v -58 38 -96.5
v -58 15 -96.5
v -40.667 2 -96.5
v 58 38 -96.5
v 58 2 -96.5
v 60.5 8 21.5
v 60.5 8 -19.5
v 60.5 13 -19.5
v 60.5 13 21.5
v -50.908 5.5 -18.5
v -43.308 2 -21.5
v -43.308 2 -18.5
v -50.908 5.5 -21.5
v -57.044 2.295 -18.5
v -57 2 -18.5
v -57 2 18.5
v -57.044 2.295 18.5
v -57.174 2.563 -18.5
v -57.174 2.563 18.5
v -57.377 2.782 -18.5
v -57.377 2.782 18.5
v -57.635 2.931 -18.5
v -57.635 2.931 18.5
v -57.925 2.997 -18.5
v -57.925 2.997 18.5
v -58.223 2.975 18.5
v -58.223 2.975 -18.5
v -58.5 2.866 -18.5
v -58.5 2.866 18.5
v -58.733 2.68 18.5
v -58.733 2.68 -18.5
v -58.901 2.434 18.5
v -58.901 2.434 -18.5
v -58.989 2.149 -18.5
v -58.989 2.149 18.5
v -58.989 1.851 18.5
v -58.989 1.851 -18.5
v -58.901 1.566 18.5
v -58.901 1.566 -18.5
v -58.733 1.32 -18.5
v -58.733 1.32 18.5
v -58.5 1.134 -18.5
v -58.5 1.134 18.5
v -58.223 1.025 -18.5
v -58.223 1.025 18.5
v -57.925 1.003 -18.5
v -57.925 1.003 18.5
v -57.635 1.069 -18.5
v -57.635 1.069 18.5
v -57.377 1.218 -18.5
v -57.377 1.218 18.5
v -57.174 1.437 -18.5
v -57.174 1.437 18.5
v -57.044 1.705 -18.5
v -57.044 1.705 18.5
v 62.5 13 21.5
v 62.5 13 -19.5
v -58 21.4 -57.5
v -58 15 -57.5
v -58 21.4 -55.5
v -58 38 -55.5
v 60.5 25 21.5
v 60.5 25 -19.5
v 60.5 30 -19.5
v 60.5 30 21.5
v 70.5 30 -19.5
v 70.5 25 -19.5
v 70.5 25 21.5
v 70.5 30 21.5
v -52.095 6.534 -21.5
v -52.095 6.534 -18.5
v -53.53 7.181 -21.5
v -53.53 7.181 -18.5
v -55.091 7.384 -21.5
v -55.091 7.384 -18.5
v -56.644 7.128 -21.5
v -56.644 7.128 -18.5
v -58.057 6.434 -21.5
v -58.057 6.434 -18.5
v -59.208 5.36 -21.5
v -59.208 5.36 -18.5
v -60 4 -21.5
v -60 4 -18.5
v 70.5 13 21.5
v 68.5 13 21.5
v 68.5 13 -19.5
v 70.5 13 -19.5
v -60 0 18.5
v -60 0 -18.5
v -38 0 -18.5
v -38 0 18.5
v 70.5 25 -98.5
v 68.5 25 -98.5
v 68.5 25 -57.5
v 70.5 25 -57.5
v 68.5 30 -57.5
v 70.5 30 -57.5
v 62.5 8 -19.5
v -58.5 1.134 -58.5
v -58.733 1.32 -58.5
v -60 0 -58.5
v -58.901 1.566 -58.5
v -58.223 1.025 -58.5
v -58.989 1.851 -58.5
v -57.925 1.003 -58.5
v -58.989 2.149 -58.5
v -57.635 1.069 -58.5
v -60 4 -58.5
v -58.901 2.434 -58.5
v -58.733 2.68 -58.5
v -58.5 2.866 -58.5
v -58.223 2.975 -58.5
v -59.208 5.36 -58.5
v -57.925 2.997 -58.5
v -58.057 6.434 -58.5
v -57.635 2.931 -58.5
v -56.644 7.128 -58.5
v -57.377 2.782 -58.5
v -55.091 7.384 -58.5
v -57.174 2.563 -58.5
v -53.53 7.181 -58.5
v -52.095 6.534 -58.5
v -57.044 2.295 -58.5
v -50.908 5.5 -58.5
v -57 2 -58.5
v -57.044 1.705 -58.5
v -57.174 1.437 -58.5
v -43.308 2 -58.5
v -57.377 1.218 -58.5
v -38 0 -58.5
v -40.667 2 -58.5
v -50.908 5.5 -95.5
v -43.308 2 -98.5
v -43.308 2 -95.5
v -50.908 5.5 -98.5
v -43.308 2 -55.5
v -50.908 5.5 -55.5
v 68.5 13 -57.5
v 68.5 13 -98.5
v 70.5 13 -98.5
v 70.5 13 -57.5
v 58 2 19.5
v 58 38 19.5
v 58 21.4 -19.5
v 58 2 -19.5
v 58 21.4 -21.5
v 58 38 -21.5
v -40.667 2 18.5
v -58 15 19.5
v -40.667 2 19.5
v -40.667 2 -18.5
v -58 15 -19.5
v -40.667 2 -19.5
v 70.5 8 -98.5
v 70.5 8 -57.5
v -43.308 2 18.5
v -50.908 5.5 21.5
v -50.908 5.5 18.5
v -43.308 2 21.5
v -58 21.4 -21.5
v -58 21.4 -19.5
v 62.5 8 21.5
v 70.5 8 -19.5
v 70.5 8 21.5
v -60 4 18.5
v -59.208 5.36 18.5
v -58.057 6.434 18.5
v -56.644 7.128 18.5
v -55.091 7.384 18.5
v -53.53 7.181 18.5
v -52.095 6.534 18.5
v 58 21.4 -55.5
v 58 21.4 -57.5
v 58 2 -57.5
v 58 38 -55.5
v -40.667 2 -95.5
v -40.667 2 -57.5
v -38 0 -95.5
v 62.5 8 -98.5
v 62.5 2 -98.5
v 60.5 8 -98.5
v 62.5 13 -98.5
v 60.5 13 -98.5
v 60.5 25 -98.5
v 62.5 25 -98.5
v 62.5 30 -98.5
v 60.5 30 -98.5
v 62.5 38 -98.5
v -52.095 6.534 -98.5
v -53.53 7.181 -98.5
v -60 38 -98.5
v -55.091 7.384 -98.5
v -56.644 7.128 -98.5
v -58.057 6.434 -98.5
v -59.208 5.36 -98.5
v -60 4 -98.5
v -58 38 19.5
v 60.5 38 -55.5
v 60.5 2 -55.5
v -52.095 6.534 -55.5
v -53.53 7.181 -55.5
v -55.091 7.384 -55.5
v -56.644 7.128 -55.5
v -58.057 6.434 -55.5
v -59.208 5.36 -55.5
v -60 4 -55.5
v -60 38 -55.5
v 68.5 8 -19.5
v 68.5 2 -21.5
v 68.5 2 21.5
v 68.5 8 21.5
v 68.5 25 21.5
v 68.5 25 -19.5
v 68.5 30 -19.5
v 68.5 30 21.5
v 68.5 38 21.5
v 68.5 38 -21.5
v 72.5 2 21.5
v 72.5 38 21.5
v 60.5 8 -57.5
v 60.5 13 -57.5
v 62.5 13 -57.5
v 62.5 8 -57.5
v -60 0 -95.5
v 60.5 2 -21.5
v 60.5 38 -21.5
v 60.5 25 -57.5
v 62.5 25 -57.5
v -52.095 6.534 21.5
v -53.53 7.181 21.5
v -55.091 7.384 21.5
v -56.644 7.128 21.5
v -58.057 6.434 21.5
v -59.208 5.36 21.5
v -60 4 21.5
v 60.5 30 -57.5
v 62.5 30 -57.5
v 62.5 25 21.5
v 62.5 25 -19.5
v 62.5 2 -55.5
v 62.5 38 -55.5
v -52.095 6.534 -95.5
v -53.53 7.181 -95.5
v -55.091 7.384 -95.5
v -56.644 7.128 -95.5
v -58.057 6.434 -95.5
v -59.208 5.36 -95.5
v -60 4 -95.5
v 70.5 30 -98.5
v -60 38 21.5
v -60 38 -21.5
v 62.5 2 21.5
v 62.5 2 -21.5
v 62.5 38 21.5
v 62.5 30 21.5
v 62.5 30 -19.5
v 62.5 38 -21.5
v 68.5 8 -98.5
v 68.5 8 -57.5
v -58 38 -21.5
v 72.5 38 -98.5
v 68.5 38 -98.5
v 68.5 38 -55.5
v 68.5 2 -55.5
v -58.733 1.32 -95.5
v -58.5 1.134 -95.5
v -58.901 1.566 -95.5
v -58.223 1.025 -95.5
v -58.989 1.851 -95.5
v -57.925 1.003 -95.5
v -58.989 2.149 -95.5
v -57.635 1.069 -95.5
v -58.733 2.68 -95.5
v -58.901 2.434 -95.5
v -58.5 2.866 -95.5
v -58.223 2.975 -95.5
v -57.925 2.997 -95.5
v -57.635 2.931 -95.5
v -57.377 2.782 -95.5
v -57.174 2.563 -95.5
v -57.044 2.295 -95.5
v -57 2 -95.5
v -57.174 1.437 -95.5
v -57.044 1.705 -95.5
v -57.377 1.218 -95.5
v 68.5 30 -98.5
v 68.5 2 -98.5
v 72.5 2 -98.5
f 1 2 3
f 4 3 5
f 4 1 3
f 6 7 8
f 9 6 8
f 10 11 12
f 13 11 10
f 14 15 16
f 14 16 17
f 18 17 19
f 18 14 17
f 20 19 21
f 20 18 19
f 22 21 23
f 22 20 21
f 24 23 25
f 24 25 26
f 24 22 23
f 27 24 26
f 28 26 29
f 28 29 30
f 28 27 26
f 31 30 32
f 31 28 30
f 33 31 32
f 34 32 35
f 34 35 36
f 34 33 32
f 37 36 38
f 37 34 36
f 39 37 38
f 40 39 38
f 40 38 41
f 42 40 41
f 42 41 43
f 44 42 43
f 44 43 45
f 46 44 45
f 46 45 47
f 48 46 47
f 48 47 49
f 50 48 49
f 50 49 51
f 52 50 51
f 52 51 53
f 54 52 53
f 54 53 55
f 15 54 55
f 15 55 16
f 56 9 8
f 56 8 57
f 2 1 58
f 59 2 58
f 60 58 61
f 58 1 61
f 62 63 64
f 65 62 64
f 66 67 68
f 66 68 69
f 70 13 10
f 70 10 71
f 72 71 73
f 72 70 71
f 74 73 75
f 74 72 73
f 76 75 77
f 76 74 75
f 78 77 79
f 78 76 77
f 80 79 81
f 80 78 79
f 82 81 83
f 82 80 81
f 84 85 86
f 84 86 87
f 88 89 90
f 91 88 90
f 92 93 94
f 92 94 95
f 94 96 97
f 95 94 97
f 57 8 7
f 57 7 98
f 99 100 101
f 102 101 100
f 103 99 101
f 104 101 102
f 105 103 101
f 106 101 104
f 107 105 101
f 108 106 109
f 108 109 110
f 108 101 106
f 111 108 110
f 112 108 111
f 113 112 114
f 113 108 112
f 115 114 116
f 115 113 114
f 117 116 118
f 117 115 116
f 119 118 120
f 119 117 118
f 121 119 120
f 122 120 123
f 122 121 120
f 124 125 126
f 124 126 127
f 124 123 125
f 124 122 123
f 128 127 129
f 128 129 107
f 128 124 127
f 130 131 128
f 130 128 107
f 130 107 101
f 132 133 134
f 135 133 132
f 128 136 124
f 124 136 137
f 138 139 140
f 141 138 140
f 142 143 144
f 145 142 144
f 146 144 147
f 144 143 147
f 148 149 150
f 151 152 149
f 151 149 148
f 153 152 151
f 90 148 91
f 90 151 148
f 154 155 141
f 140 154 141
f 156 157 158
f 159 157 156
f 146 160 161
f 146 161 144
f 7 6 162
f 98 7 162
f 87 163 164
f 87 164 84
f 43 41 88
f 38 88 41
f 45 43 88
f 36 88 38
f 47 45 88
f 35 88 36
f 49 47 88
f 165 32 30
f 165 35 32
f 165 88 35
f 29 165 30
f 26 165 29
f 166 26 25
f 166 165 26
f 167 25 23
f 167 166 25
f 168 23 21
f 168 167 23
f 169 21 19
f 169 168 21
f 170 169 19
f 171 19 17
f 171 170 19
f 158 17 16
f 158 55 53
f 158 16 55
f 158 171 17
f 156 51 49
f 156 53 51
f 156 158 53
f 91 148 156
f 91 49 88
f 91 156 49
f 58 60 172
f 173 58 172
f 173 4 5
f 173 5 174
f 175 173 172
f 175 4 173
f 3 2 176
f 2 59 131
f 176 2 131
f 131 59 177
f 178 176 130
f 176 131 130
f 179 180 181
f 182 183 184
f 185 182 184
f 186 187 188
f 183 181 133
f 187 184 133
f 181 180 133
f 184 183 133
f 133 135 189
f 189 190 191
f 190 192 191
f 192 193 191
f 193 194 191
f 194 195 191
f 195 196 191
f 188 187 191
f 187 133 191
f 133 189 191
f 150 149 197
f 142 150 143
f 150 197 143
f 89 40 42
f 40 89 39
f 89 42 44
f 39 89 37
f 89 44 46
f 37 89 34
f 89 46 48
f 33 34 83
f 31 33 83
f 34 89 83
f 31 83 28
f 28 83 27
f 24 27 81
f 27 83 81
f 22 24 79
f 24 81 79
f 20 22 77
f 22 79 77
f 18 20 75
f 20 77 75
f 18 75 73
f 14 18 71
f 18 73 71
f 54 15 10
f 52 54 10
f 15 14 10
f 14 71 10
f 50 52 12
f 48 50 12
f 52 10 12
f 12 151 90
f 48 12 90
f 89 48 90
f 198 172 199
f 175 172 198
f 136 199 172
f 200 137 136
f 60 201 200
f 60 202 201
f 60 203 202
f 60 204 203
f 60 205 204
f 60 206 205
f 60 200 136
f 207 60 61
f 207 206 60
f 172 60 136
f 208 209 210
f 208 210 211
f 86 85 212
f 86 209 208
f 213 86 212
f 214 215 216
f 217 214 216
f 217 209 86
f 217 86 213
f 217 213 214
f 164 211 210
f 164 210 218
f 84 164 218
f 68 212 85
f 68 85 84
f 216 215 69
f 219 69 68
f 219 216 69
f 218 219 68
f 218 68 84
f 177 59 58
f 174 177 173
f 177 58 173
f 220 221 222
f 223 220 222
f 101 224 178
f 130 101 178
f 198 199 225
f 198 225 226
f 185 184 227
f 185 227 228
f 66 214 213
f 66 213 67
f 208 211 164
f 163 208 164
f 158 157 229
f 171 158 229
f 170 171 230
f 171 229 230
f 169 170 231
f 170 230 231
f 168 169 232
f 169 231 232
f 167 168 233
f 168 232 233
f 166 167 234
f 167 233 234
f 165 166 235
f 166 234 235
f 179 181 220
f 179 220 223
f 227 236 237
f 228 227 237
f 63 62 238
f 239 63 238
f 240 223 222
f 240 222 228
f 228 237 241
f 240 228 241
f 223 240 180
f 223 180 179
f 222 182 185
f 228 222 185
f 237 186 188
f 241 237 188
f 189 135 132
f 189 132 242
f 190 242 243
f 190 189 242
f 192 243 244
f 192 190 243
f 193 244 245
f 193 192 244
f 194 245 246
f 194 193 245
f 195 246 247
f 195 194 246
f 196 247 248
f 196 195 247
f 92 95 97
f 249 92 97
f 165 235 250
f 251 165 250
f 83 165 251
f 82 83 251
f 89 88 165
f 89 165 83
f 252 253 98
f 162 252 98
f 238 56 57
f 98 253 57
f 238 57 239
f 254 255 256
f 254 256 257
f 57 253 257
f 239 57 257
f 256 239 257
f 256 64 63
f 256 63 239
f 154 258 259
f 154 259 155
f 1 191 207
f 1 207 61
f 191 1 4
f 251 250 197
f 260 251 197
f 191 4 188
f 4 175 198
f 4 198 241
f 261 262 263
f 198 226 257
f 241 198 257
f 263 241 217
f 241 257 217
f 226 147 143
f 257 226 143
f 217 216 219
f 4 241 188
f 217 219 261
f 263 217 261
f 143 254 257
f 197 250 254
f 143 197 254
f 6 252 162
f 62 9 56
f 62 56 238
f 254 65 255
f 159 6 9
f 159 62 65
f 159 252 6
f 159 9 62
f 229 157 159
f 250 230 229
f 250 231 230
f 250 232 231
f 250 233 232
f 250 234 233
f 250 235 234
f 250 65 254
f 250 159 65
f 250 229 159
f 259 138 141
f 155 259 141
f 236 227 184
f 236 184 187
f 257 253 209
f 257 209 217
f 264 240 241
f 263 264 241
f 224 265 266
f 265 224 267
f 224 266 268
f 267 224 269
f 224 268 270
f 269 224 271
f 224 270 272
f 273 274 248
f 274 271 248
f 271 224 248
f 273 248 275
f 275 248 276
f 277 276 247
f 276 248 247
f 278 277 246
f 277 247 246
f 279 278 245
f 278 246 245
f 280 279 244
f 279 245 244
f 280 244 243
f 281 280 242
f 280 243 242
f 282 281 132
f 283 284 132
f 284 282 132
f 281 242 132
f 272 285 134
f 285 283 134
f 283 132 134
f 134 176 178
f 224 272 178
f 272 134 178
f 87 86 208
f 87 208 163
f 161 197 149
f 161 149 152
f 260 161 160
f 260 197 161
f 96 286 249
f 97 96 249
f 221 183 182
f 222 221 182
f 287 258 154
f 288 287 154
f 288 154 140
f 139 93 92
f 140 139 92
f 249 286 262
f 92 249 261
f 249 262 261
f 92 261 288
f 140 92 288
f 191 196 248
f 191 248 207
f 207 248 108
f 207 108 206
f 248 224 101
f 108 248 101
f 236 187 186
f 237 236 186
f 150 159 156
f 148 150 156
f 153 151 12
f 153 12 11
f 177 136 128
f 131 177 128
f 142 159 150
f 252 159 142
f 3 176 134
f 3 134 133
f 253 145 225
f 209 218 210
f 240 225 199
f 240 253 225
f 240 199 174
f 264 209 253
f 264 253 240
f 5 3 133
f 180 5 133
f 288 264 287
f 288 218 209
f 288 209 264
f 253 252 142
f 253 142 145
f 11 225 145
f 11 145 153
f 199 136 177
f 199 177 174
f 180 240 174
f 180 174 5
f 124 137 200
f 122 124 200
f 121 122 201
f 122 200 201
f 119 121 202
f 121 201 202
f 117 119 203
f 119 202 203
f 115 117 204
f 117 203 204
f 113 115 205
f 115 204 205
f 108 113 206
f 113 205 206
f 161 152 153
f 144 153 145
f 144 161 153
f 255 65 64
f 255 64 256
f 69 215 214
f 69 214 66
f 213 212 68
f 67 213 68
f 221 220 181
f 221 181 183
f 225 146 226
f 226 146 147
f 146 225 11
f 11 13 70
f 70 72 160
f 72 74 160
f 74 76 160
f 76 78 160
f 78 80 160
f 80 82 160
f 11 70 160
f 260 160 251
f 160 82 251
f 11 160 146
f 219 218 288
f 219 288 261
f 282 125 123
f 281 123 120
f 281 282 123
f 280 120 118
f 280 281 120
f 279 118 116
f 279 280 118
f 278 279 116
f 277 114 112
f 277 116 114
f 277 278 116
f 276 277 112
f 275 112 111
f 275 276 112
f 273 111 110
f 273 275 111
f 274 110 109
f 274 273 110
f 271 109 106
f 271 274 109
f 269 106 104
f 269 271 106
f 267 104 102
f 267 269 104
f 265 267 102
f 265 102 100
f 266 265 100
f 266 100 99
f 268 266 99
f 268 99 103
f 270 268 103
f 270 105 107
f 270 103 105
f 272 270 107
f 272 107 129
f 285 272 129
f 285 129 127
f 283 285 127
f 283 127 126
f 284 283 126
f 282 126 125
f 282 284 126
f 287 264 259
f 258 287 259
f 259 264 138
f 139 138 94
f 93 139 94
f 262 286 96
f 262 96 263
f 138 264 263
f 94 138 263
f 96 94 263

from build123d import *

# Parameters (mm, degrees)
SKETCH2_W            = 120
SKETCH2_H            = 43
BOSS_EXTRUDE1_DEPTH  = 38
SKETCH3_W            = 116
SKETCH3_H            = 39
CUT_EXTRUDE1_DEPTH   = 38
BOSS_EXTRUDE2_DEPTH  = 39
SKETCH5_W            = 43
SKETCH5_H            = 38
BOSS_EXTRUDE3_DEPTH  = 2.5
SKETCH6_W            = 2
SKETCH6_H            = 38
BOSS_EXTRUDE4_DEPTH  = 17
SKETCH7_W            = 34
SKETCH7_H            = 38
BOSS_EXTRUDE5_DEPTH  = 10
SKETCH8_W            = 4
SKETCH8_H            = 38
BOSS_EXTRUDE6_DEPTH  = 43
SKETCH9_W            = 10
SKETCH9_H            = 5
CUT_EXTRUDE2_DEPTH   = 41
SKETCH11_W           = 120
SKETCH11_H           = 2
CUT_EXTRUDE3_DEPTH   = 110.5
CUT_EXTRUDE4_DEPTH   = 3
MIRROR4_COPY_1_DEPTH = 3
CUT_EXTRUDE5_START   = -114
SKETCH13_R           = 1
CUT_EXTRUDE5_DEPTH   = 114
SKETCH14_W           = 116
SKETCH14_H           = 2
CUT_EXTRUDE6_DEPTH   = 16.6


with BuildPart() as part:
    # Sketch2 → Boss-Extrude1 (new body)
    with BuildSketch(Plane(origin=(0, 0, 0), x_dir=(1, 0, 0), z_dir=(0, 1, 0))):
        Rectangle(SKETCH2_W, SKETCH2_H)
    extrude(amount=BOSS_EXTRUDE1_DEPTH)

    # Sketch3 → Cut-Extrude1 (cut)
    with BuildSketch(Plane(origin=(0, 38, 0), x_dir=(1, 0, 0), z_dir=(0, 1, 0))):
        Rectangle(SKETCH3_W, SKETCH3_H)
    extrude(amount=-CUT_EXTRUDE1_DEPTH, mode=Mode.SUBTRACT)

    # Sketch4 → Boss-Extrude2 (add)
    with BuildSketch(Plane.XY.offset(-19.5)):
        Polygon((-58, 0), (-58, 15), (-38, 0), align=None)
    extrude(amount=BOSS_EXTRUDE2_DEPTH)

    # Sketch5 → Boss-Extrude3 (add)
    with BuildSketch(Plane(origin=(60, 0, 0), x_dir=(0, 0, -1), z_dir=(1, 0, 0))):
        with Locations((0, 19)):
            Rectangle(SKETCH5_W, SKETCH5_H)
    extrude(amount=BOSS_EXTRUDE3_DEPTH)

    # Sketch6 → Boss-Extrude4 (add)
    with BuildSketch(Plane(origin=(0, 0, -21.5), x_dir=(-1, 0, 0), z_dir=(0, 0, -1))):
        with Locations((-61.5, 19)):
            Rectangle(SKETCH6_W, SKETCH6_H)
    extrude(amount=BOSS_EXTRUDE4_DEPTH)

    # Mirror1: part across plane


with BuildPart() as part_1:
    add(part.part)
    add(part.part.mirror(Plane(origin=(0, 0, -38.5), x_dir=(1, 0, 0), z_dir=(0, 0, -1))))

    # Sketch7 → Boss-Extrude5 (add)
    with BuildSketch(Plane(origin=(62.5, 0, 0), x_dir=(0, 0, -1), z_dir=(1, 0, 0))):
        with Locations((38.5, 19)):
            Rectangle(SKETCH7_W, SKETCH7_H)
    extrude(amount=BOSS_EXTRUDE5_DEPTH)

    # Sketch8 → Boss-Extrude6 (add)
    with BuildSketch(Plane.XY.offset(-21.5)):
        with Locations((70.5, 19)):
            Rectangle(SKETCH8_W, SKETCH8_H)
    boss_extrude6 = extrude(amount=BOSS_EXTRUDE6_DEPTH)

    # Sketch9 → Cut-Extrude2 (cut)
    with BuildSketch(Plane.XY.offset(21.5)):
        with Locations((65.5, 27.5)):
            Rectangle(SKETCH9_W, SKETCH9_H)
        with Locations((65.5, 10.5)):
            Rectangle(SKETCH9_W, SKETCH9_H)
    cut_extrude2 = extrude(amount=-CUT_EXTRUDE2_DEPTH, mode=Mode.SUBTRACT)

    # Mirror2: Boss-Extrude6, Cut-Extrude2 across plane
    add(boss_extrude6.mirror(Plane(origin=(0, 0, -38.5), x_dir=(1, 0, 0), z_dir=(0, 0, -1))))
    add(cut_extrude2.mirror(Plane(origin=(0, 0, -38.5), x_dir=(1, 0, 0), z_dir=(0, 0, -1))), mode=Mode.SUBTRACT)

    # Sketch11 → Cut-Extrude3 (cut)
    with BuildSketch(Plane(origin=(72.5, 0, 0), x_dir=(0, 0, -1), z_dir=(1, 0, 0))):
        with Locations((38.5, 1)):
            Rectangle(SKETCH11_W, SKETCH11_H)
    extrude(amount=-CUT_EXTRUDE3_DEPTH, mode=Mode.SUBTRACT)

    # Sketch12 → Cut-Extrude4 (cut)
    with BuildSketch(Plane.XY.offset(21.5)):
        with BuildLine():
            Line((-38, 2), (-49.614835193, 2))
            ThreePointArc((-49.614835193, 2), (-56.018375168, 7.287996976), (-60, 0))
            Line((-60, 0), (-38, 0))
            Line((-38, 0), (-38, 2))
        make_face()
    cut_extrude4 = extrude(amount=-CUT_EXTRUDE4_DEPTH, mode=Mode.SUBTRACT)

    # Mirror3: Cut-Extrude4 across plane
    add(cut_extrude4.mirror(Plane.XY), mode=Mode.SUBTRACT)

    # Mirror4: Cut-Extrude4 across plane
    add(cut_extrude4.mirror(Plane(origin=(0, 0, -38.5), x_dir=(1, 0, 0), z_dir=(0, 0, -1))), mode=Mode.SUBTRACT)

    # Mirror4 copy 1 sketch → Mirror4 copy 1 (cut)
    with BuildSketch(Plane.XY.offset(-55.5)):
        with BuildLine():
            Line((-38, 2), (-49.614835193, 2))
            ThreePointArc((-49.614835193, 2), (-56.018375168, 7.287996976), (-60, 0))
            Line((-60, 0), (-38, 0))
            Line((-38, 0), (-38, 2))
        make_face()
    extrude(amount=-MIRROR4_COPY_1_DEPTH, mode=Mode.SUBTRACT)

    # Sketch13 → Cut-Extrude5 (cut)
    with BuildSketch(Plane.XY.offset(18.5).offset(CUT_EXTRUDE5_START)):
        with Locations((-58, 2)):
            Circle(SKETCH13_R)
    extrude(amount=CUT_EXTRUDE5_DEPTH, mode=Mode.SUBTRACT)

    # Chamfer1
    # the kernel refuses this chamfer: 10 mm, written as the material it takes off along each edge
    with BuildSketch(Plane(origin=(-49.614835193, 2, 38.180669666), x_dir=(-0.41152080336556635, 0.9114003666870882, 0), z_dir=(0, 0, -1))) as chamfer1_piece_1:
        with BuildLine():
            Line((4.024103798, 0), (-2.897424879, 6.010331734))
            Line((-2.897424879, 6.010331734), (-3.079704953, 5.928027573))
            ThreePointArc((-3.079704953, 5.928027573), (-1.554736759, 2.957293148), (-0.182280073, -0.082304161))
            Line((-0.182280073, -0.082304161), (0.082304161, -0.182280073))
            ThreePointArc((0.082304161, -0.182280073), (2.000716354, 0.27264804), (3.968173362, -0.192020276))
            Line((3.968173362, -0.192020276), (4.024103798, 0))
        make_face()
    extrude(amount=19.680669666, mode=Mode.SUBTRACT)

    # Chamfer2
    # the kernel refuses this chamfer: 10 mm, written as the material it takes off along each edge
    with BuildSketch(Plane(origin=(-49.614835193, 2, -38.180669666), x_dir=(0.9996854583228201, -0.0250795617564035, 0), z_dir=(0, 0, 1))) as chamfer2_piece_1:
        with BuildLine():
            Line((6.672267866, 0), (-1.747462586, 3.624884258))
            Line((-1.747462586, 3.624884258), (-1.896145364, 3.491117927))
            ThreePointArc((-1.896145364, 3.491117927), (-0.623209418, 1.920628258), (-0.199937092, -0.005015912))
            Line((-0.199937092, -0.005015912), (0.005015912, -0.199937092))
            ThreePointArc((0.005015912, -0.199937092), (3.339051469, -0.116294632), (6.677283779, -0.199937092))
            Line((6.677283779, -0.199937092), (6.672267866, 0))
        make_face()
    extrude(amount=19.680669666, mode=Mode.SUBTRACT)

    # Chamfer3
    # the kernel refuses this chamfer: 10 mm, written as the material it takes off along each edge
    with BuildSketch(Plane(origin=(-49.614835193, 2, -38.819330334), x_dir=(0.9996854583228201, -0.02507956175640344, 0), z_dir=(0, 0, -1))) as chamfer3_piece_1:
        with BuildLine():
            Line((6.672267866, 0), (-1.747462586, -3.624884258))
            Line((-1.747462586, -3.624884258), (-1.896145364, -3.491117927))
            ThreePointArc((-1.896145364, -3.491117927), (-0.623209418, -1.920628258), (-0.199937092, 0.005015912))
            Line((-0.199937092, 0.005015912), (0.005015912, 0.199937092))
            ThreePointArc((0.005015912, 0.199937092), (3.339051469, 0.116294632), (6.677283779, 0.199937092))
            Line((6.677283779, 0.199937092), (6.672267866, 0))
        make_face()
    extrude(amount=19.680669666, mode=Mode.SUBTRACT)

    # Chamfer4
    # the kernel refuses this chamfer: 10 mm, written as the material it takes off along each edge
    with BuildSketch(Plane(origin=(-49.614835193, 2, -115.180669666), x_dir=(0.9996854583228201, -0.0250795617564035, 0), z_dir=(0, 0, 1))) as chamfer4_piece_1:
        with BuildLine():
            Line((6.672267866, 0), (-1.747462586, 3.624884258))
            Line((-1.747462586, 3.624884258), (-1.896145364, 3.491117927))
            ThreePointArc((-1.896145364, 3.491117927), (-0.623209418, 1.920628258), (-0.199937092, -0.005015912))
            Line((-0.199937092, -0.005015912), (0.005015912, -0.199937092))
            ThreePointArc((0.005015912, -0.199937092), (3.339051469, -0.116294632), (6.677283779, -0.199937092))
            Line((6.677283779, -0.199937092), (6.672267866, 0))
        make_face()
    extrude(amount=19.680669666, mode=Mode.SUBTRACT)

    # Sketch14 → Cut-Extrude6 (cut)
    with BuildSketch(Plane(origin=(0, 38, 0), x_dir=(1, 0, 0), z_dir=(0, 1, 0))):
        with Locations((0, 20.5)):
            Rectangle(SKETCH14_W, SKETCH14_H)
    cut_extrude6 = extrude(amount=-CUT_EXTRUDE6_DEPTH, mode=Mode.SUBTRACT)

    # Mirror5: Cut-Extrude6 across plane
    add(cut_extrude6.mirror(Plane(origin=(0, 0, -38.5), x_dir=(1, 0, 0), z_dir=(0, 0, -1))), mode=Mode.SUBTRACT)


solid = part_1.part
